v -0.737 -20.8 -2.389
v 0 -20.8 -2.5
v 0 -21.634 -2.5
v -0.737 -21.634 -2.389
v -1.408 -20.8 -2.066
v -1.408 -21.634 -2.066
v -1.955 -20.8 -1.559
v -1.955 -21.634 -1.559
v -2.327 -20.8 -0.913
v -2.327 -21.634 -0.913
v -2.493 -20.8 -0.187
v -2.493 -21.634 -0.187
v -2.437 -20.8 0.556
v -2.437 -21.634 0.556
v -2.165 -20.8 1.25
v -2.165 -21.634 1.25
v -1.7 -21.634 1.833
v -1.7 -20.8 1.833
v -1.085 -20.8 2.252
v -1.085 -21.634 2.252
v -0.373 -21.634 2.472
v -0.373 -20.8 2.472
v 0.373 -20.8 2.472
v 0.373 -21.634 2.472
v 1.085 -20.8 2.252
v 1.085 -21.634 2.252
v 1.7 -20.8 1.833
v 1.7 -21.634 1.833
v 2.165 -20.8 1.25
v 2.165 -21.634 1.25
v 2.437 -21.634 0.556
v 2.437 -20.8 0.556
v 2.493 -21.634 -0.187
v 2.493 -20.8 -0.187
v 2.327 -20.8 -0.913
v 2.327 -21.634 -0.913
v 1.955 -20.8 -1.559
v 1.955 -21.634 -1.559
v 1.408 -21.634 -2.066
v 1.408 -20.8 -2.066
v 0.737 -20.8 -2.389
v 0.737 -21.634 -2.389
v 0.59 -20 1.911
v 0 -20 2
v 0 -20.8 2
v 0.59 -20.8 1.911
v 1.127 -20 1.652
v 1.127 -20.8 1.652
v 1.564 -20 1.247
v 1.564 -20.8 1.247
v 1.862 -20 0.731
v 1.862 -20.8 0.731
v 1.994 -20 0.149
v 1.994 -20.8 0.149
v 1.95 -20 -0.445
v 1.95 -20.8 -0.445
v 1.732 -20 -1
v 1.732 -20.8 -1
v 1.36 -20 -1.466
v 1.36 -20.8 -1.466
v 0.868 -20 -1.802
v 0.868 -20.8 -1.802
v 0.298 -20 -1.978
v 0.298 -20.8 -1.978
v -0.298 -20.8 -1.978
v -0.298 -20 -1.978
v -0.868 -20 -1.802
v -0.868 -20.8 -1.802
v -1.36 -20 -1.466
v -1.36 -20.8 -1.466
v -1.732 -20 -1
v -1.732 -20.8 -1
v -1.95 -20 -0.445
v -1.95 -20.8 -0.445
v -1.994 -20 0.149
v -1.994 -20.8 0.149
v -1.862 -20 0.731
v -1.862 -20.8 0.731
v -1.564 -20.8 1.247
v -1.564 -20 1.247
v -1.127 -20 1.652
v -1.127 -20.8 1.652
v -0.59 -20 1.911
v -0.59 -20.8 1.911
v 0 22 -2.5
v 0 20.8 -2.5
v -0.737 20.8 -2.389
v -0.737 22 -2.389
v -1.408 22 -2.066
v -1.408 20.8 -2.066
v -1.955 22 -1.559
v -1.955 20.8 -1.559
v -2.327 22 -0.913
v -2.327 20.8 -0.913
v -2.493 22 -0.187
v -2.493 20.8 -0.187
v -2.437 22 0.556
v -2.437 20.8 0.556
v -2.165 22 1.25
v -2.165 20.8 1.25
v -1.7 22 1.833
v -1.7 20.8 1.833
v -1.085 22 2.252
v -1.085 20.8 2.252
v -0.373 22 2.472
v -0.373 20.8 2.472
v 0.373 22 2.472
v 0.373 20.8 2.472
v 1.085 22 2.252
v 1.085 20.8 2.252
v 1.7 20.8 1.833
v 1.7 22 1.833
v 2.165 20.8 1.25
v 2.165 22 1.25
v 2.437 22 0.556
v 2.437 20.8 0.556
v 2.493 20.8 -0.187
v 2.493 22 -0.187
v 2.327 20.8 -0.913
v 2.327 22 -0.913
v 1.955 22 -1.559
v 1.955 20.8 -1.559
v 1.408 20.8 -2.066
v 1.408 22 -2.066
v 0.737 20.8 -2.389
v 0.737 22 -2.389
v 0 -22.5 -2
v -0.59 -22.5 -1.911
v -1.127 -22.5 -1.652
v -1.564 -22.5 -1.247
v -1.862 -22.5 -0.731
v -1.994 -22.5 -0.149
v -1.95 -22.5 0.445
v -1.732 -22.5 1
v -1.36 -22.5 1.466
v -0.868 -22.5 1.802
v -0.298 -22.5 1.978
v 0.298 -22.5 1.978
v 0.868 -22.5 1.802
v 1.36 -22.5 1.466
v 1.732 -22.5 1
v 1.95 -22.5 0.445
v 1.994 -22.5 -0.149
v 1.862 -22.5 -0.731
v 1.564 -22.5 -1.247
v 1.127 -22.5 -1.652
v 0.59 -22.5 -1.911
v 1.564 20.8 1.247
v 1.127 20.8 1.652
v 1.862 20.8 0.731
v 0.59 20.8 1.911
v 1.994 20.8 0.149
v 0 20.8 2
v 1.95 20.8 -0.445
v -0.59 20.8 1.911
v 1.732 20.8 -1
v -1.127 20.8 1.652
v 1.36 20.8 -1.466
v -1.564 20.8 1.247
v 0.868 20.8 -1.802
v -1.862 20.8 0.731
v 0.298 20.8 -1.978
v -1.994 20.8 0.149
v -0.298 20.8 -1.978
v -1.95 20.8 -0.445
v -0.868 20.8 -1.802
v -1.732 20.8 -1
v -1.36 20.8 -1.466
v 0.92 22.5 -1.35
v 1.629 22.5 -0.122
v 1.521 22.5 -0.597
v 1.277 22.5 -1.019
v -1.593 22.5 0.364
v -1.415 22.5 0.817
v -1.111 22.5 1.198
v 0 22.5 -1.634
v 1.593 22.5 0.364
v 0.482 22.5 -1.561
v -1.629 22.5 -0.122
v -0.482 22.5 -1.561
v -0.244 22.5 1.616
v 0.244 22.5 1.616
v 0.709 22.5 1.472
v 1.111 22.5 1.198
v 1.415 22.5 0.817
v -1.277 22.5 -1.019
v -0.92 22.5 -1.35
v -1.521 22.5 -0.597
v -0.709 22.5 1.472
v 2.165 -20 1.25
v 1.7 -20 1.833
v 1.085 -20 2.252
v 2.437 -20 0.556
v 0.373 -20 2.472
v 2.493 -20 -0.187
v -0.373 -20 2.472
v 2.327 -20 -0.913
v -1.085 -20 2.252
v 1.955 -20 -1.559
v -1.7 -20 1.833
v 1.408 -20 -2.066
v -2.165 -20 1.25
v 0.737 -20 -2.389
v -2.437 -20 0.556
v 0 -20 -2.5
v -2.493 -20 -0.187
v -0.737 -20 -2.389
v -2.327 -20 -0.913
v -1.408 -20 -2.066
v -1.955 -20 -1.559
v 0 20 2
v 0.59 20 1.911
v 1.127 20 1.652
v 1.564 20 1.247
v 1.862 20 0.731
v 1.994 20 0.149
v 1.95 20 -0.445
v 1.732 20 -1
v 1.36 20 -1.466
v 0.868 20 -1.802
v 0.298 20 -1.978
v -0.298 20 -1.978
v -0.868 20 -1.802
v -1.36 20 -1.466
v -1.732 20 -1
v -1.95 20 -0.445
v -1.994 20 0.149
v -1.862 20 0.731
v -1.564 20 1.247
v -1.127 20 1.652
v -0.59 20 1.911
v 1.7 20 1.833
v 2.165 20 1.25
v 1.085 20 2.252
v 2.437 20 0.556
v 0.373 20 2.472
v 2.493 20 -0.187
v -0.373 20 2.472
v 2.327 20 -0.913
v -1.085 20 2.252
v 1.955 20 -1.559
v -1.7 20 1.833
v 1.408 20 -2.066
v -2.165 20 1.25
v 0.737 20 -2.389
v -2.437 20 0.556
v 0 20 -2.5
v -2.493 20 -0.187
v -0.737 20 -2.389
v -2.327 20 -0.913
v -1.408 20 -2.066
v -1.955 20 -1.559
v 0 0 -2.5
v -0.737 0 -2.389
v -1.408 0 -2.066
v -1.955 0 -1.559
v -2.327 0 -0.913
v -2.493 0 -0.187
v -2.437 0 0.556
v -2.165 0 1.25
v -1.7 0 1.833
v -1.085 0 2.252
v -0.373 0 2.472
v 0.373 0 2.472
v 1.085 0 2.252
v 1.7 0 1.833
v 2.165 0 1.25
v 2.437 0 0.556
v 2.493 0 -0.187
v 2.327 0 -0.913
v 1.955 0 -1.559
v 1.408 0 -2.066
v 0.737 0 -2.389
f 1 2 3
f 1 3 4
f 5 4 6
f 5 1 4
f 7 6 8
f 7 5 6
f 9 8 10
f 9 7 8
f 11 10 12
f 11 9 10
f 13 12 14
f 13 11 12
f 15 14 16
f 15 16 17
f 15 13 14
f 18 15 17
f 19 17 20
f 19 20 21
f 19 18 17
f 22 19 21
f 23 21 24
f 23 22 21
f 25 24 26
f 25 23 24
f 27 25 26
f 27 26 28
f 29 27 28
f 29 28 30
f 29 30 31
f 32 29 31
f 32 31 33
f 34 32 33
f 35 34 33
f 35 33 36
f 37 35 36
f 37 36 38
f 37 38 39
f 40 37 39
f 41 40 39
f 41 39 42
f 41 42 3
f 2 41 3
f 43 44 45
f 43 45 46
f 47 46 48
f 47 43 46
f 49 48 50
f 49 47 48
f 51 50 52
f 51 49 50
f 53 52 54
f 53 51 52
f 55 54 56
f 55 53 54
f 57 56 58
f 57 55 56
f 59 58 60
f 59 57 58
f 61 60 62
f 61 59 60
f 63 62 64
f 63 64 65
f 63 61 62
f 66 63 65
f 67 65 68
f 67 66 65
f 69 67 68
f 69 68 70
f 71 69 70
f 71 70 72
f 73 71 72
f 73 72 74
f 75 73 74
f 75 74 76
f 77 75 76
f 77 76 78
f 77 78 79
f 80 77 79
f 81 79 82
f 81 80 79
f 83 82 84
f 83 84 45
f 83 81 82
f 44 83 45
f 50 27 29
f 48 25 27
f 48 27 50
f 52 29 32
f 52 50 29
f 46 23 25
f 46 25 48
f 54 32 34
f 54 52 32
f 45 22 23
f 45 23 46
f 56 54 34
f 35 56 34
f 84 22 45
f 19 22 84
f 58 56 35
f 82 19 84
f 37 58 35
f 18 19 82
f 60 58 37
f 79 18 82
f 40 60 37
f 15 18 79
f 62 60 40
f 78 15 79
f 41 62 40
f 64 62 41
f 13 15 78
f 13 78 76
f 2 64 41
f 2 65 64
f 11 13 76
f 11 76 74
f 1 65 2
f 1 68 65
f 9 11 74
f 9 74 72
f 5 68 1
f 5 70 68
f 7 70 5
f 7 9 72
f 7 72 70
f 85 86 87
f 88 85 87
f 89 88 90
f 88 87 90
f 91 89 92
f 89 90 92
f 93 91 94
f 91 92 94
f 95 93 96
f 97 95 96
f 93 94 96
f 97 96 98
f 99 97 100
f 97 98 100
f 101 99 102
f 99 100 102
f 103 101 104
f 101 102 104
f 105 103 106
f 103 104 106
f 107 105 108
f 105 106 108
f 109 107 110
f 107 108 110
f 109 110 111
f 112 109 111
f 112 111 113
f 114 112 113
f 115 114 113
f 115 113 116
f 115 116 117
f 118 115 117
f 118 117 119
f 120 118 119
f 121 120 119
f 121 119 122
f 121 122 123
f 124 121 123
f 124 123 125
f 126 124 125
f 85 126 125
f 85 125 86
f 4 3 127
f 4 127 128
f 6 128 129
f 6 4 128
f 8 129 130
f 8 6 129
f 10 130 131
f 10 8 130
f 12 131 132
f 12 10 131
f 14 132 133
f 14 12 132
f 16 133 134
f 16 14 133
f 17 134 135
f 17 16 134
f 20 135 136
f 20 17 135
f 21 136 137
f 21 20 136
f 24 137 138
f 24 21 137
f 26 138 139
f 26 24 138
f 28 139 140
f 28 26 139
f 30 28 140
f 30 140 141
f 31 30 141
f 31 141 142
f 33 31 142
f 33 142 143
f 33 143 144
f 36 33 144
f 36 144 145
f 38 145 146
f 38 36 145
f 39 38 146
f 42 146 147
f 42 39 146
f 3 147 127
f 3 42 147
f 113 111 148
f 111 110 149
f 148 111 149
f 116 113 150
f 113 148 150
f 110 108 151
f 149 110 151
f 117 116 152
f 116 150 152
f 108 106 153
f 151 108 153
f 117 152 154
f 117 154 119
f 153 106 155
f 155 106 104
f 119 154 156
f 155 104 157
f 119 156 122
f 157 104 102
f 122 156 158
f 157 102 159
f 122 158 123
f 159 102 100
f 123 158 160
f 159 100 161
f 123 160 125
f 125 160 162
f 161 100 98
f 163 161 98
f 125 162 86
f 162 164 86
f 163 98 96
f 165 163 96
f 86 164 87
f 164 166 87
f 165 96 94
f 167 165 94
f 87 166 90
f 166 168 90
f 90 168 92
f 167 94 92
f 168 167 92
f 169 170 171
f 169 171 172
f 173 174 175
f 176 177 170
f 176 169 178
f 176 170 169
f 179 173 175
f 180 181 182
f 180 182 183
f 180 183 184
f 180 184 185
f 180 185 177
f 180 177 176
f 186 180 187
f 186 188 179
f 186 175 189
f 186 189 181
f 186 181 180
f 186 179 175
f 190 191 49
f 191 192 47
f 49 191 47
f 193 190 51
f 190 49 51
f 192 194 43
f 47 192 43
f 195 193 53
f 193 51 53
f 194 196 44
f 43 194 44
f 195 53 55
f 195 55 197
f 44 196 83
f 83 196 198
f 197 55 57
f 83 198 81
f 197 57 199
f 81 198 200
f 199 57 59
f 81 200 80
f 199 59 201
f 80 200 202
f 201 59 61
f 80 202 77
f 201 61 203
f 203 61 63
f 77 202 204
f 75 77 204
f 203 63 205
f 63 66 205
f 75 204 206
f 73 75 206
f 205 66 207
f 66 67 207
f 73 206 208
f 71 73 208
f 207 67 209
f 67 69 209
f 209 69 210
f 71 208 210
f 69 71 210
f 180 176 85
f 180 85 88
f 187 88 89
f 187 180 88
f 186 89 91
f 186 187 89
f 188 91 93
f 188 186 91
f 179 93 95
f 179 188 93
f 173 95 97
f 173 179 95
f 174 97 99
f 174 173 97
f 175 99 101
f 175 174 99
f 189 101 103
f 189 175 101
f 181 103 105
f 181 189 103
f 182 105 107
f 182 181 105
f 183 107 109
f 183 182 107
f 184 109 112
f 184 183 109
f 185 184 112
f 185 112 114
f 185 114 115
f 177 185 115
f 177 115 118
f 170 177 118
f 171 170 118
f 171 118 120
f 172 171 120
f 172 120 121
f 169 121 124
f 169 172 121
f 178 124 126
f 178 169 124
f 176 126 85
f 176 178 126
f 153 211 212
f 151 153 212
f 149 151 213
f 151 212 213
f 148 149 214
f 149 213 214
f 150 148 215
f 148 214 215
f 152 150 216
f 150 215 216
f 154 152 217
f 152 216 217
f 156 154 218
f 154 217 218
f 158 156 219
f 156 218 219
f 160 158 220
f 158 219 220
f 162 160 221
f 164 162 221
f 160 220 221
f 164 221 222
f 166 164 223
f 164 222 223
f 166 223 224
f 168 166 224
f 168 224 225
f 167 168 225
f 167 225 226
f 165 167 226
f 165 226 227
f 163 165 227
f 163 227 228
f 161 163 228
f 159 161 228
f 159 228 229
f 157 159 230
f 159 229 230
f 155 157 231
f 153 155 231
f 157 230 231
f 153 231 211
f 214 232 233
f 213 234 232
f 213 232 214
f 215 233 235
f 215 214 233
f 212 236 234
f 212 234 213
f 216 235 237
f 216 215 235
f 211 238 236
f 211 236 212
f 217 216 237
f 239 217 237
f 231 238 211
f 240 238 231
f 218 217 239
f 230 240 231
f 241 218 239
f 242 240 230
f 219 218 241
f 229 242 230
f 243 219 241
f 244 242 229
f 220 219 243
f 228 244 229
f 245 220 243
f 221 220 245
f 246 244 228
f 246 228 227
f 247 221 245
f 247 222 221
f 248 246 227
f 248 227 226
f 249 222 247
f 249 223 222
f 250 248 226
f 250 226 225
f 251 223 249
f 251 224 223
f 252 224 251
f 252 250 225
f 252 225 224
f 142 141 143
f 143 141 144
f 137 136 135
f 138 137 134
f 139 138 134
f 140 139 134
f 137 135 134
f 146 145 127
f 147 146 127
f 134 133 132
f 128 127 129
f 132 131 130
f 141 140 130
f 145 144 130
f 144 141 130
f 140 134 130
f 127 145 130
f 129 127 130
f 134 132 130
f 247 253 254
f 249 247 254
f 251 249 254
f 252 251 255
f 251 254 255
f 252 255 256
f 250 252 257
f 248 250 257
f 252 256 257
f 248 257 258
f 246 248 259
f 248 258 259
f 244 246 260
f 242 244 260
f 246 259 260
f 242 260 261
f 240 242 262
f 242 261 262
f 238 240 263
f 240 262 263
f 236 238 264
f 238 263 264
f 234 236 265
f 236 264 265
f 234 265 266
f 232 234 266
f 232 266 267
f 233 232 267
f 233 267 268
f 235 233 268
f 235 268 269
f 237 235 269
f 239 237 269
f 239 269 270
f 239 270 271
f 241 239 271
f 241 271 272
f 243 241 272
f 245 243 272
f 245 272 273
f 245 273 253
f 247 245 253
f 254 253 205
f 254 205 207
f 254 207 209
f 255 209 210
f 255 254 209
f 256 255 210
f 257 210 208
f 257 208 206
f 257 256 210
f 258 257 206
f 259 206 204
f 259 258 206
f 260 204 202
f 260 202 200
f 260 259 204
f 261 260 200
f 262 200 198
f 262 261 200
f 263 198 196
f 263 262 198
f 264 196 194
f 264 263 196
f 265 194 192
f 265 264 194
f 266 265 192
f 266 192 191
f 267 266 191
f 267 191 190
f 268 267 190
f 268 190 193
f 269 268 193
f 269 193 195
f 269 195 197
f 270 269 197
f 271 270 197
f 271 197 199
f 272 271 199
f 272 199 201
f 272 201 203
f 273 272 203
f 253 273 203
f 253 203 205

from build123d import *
from OCP.BRepFilletAPI import BRepFilletAPI_MakeChamfer

# Parameters (mm, degrees)
SKETCH_1_R          = 2.5
EXTRUDE_2_DEPTH     = 22.5
SKETCH_2_R          = 2.5
SKETCH_2_R_2        = 2
CUT_EXTRUDE_1_DEPTH = 0.8
CHAMFER_3_SIZE      = 0.5
CHAMFER_3_SIZE2     = 0.866025404


with BuildPart() as part:
    # 草图1 → 凸台-拉伸2 (new body)
    with BuildSketch(Plane(origin=(0, 0, 0), x_dir=(1, 0, 0), z_dir=(0, 1, 0))):
        with Locations(Location((0, 0, 0), (0, 0, 90))):
            Circle(SKETCH_1_R)
    extrude_2 = extrude(amount=EXTRUDE_2_DEPTH)

    # 草图2 → 切除-拉伸1 (cut)
    with BuildSketch(Plane(origin=(0, 20, 0), x_dir=(1, 0, 0), z_dir=(0, 1, 0))):
        with Locations(Location((0, 0, 0), (0, 0, 90))):
            Circle(SKETCH_2_R)
        with Locations(Location((0, 0, 0), (0, 0, 270))):
            Circle(SKETCH_2_R_2, mode=Mode.SUBTRACT)
    cut_extrude_1 = extrude(amount=CUT_EXTRUDE_1_DEPTH, mode=Mode.SUBTRACT)

    # 镜向3: 凸台-拉伸2 across plane
    add(extrude_2.mirror(Plane.ZX))

    # 镜向5: 切除-拉伸1 across plane
    add(cut_extrude_1.mirror(Plane.ZX), mode=Mode.SUBTRACT)

    # 倒角3: one chamfer whose edges measure the first distance from different faces: ONE call of the kernel's chamfer builder (chamfer() names one face for all edges)
    chamfer_3_edges_1 = [part.edges().sort_by_distance(p)[0] for p in [
        (0, -22.5, 2.5),
    ]]
    chamfer_3_side_1 = [part.faces().sort_by_distance(p)[0] for p in [
        (0, -22.5, 0),
    ]]
    chamfer_3_edges_2 = [part.edges().sort_by_distance(p)[0] for p in [
        (0, 22.5, 2.5),
    ]]
    chamfer_3_side_2 = [part.faces().sort_by_distance(p)[0] for p in [
        (0, 21.65, 2.5),
    ]]
    chamfer_3 = BRepFilletAPI_MakeChamfer(part.part.solid().wrapped)
    for e in chamfer_3_edges_1:
        chamfer_3.Add(CHAMFER_3_SIZE, CHAMFER_3_SIZE2, e.wrapped, chamfer_3_side_1[0].wrapped)  # the first distance lies on this face
    for e in chamfer_3_edges_2:
        chamfer_3.Add(CHAMFER_3_SIZE, CHAMFER_3_SIZE2, e.wrapped, chamfer_3_side_2[0].wrapped)  # the first distance lies on this face
    add(Compound.cast(chamfer_3.Shape()), mode=Mode.REPLACE)


solid = part.part
